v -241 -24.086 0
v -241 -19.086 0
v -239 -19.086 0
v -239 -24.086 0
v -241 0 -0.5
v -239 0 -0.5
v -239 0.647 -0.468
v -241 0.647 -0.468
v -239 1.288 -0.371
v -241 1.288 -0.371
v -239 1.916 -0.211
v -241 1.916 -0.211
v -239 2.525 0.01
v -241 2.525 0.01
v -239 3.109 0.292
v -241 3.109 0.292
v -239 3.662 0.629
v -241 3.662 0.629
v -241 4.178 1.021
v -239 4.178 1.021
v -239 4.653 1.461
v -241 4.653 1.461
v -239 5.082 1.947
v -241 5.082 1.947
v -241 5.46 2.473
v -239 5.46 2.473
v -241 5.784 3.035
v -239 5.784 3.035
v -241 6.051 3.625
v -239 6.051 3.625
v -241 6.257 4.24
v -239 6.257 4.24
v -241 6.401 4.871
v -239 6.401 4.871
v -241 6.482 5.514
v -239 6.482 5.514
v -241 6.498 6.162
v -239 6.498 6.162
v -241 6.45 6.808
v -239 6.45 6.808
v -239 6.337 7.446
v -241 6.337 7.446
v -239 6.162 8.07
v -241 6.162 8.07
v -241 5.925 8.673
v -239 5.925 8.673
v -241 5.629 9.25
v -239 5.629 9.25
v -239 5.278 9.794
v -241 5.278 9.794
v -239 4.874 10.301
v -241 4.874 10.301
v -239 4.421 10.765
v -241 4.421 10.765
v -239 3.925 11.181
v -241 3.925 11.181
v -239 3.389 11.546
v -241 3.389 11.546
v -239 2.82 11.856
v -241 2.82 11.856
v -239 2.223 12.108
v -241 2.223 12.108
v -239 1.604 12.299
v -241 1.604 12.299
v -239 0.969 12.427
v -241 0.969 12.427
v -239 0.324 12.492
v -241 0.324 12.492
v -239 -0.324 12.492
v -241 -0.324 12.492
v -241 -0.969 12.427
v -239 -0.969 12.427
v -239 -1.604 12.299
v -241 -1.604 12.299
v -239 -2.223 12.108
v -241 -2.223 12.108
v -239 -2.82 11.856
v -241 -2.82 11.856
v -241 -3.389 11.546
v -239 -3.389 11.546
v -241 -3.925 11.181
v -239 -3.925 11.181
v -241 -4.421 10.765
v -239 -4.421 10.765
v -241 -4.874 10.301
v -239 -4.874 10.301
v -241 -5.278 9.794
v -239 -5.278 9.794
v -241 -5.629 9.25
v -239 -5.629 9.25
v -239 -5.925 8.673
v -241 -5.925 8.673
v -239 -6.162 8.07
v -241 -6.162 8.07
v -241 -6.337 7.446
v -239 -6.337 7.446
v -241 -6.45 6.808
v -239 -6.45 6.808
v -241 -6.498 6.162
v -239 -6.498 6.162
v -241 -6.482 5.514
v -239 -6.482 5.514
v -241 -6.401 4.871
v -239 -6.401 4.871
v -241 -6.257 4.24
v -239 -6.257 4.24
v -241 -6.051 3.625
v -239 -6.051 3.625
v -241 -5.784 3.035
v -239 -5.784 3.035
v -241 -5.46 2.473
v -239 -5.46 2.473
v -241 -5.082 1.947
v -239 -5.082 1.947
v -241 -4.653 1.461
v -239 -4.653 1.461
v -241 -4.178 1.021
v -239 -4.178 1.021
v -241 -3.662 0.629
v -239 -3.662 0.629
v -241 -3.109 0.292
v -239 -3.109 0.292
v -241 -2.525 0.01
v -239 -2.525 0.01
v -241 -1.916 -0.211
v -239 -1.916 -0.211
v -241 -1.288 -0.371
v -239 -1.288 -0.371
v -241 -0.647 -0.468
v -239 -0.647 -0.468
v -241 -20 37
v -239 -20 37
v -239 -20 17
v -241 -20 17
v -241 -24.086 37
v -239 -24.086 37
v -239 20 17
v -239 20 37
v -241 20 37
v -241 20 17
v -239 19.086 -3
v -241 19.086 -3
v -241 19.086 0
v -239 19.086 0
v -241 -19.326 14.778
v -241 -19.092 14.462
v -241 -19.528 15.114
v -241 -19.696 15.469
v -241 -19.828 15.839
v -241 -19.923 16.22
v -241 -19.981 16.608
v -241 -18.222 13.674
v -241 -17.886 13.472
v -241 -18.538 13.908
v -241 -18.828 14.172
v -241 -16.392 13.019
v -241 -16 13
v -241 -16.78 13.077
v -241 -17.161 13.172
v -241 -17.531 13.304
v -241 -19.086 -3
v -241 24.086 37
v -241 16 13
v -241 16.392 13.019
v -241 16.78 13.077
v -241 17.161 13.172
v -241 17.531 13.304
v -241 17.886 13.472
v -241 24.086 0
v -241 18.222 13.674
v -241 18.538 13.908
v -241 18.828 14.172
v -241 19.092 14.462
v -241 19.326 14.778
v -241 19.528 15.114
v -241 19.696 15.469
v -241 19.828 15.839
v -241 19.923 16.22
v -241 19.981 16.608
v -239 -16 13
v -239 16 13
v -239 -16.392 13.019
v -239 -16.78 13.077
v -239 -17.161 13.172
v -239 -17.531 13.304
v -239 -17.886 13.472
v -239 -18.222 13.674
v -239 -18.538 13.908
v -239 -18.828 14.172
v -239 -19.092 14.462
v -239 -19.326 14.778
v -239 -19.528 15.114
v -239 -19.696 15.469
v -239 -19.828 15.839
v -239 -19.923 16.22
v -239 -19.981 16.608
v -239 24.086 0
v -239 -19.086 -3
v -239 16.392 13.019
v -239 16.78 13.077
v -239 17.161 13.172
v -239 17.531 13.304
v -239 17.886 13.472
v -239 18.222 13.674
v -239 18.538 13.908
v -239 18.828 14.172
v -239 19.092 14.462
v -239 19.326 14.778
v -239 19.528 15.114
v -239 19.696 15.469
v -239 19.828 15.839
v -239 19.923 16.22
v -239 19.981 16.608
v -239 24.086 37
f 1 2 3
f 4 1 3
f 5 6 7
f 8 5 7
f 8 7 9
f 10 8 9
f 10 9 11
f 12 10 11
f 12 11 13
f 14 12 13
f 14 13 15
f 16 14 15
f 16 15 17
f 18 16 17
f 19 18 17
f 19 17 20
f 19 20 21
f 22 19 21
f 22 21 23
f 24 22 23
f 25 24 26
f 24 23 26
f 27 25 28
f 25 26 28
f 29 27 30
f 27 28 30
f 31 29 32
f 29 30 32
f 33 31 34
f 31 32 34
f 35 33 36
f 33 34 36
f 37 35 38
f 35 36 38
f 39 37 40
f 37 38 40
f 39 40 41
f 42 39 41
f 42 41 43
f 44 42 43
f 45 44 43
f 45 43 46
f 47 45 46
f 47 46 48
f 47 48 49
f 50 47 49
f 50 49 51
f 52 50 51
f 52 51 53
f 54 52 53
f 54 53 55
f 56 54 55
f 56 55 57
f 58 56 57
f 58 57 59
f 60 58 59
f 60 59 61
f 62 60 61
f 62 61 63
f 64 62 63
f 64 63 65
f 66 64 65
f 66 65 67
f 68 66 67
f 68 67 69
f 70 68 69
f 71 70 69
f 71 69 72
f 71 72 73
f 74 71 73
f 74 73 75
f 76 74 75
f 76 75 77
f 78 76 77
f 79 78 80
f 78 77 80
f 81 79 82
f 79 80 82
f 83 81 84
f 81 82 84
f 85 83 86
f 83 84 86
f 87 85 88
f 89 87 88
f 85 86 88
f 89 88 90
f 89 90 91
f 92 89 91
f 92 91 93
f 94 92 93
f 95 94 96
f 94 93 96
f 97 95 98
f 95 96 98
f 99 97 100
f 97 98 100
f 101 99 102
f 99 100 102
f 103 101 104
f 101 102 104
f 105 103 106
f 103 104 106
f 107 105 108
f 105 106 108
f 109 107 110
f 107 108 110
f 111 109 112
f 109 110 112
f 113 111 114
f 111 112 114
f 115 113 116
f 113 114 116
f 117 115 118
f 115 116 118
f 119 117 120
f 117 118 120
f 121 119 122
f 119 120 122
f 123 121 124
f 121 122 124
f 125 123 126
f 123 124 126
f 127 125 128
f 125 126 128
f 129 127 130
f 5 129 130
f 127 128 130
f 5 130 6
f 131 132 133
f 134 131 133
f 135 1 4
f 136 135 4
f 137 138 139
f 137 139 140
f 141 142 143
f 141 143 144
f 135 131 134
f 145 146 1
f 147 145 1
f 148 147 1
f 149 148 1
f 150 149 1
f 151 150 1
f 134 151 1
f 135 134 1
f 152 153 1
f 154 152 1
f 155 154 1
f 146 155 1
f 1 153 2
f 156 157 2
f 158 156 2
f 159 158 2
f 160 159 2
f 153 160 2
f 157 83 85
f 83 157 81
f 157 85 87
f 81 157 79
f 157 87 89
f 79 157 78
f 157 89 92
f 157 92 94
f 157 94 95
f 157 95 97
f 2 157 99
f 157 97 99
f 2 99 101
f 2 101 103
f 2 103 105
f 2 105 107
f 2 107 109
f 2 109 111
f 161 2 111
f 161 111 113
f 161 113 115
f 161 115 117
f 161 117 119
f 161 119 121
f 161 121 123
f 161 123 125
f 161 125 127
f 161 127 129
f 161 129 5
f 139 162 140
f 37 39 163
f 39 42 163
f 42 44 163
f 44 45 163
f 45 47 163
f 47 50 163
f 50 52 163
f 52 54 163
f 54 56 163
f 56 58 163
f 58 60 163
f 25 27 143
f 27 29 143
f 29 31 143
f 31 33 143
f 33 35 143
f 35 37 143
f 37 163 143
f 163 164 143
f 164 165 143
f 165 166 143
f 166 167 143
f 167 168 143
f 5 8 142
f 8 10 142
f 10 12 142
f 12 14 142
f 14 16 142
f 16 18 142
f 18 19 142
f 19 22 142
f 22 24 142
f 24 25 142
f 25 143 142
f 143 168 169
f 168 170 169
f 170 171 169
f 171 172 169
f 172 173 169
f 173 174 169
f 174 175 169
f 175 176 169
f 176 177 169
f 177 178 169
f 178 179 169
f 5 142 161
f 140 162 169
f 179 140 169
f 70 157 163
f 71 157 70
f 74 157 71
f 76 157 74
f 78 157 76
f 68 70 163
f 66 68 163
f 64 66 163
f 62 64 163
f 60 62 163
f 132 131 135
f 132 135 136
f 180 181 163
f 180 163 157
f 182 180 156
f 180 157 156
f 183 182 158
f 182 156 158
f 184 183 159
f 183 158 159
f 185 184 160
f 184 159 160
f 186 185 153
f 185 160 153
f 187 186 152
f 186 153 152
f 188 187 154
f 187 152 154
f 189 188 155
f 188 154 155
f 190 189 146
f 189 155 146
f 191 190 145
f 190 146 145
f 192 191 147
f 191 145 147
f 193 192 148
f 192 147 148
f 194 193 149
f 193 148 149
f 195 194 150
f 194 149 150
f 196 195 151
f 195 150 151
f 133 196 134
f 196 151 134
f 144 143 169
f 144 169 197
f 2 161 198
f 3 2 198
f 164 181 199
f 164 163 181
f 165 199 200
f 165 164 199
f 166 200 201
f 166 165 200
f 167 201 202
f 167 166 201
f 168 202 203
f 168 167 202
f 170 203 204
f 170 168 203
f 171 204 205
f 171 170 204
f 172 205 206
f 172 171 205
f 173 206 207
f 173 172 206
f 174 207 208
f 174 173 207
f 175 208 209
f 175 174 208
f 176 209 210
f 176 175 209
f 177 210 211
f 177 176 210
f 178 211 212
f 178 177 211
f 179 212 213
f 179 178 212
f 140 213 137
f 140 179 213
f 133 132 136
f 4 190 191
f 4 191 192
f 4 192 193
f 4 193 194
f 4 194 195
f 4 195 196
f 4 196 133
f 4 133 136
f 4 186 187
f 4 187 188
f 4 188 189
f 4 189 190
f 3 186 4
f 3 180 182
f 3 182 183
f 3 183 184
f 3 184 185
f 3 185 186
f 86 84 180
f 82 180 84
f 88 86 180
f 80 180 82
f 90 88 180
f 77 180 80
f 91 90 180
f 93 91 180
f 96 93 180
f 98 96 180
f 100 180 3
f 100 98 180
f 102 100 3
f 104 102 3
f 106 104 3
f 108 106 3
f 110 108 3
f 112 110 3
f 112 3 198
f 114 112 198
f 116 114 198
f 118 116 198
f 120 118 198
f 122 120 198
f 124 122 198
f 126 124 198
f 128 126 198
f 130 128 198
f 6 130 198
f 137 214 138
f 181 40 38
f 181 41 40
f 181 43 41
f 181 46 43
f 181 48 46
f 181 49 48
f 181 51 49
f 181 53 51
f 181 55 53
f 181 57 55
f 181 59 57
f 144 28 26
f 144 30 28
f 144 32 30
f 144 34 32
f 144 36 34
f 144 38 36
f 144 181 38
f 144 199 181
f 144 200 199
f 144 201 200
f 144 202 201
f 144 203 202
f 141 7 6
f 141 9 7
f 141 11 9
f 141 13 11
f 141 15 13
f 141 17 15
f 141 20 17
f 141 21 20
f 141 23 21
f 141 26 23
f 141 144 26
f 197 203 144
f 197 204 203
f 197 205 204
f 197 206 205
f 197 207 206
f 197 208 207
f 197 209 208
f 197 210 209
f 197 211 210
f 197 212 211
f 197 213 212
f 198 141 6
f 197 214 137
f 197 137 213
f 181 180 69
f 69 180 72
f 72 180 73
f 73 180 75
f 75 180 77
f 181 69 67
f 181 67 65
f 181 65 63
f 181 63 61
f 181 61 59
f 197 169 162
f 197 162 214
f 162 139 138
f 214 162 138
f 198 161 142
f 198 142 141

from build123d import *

# Parameters (mm, degrees)
ESTRUSIONE_ESTRUSIONE1_DEPTH      = 13
ESTRUSIONE_ESTRUSIONE1_DEPTH_BACK = 3
SCHIZZO1_W                        = 2
SCHIZZO1_H                        = 38.172865154
SCHIZZO2_W                        = 2
SCHIZZO2_H                        = 37
ESTRUSIONE_ESTRUSIONE2_DEPTH      = 5
SCHIZZO3_W                        = 24
SCHIZZO3_H                        = 0.913567423
TAGLIO_ESTRUSIONE1_DEPTH          = 10
RACCORDO1_R                       = 4
RACCORDO1_OF_SPECCHIA1_R          = 4
SCHIZZO4_R                        = 6.5
TAGLIO_ESTRUSIONE2_DEPTH          = 10


with BuildPart() as part:
    # Schizzo1 → Estrusione-Estrusione1 (new, two sides: drawn at the far end of the back side and taken through both)
    with BuildSketch(Plane.XY.offset(-ESTRUSIONE_ESTRUSIONE1_DEPTH_BACK)):
        with Locations((-240, 0)):
            Rectangle(SCHIZZO1_W, SCHIZZO1_H)
    extrude(amount=ESTRUSIONE_ESTRUSIONE1_DEPTH + ESTRUSIONE_ESTRUSIONE1_DEPTH_BACK)

    # Schizzo2 → Estrusione-Estrusione2 (add)
    with BuildSketch(Plane(origin=(0, 19.086432577, 0), x_dir=(1, 0, 0), z_dir=(0, 1, 0))):
        with Locations((-240, -18.5)):
            Rectangle(SCHIZZO2_W, SCHIZZO2_H)
    estrusione_estrusione2 = extrude(amount=ESTRUSIONE_ESTRUSIONE2_DEPTH)

    # Schizzo3 → Taglio-Estrusione1 (cut)
    with BuildSketch(Plane(origin=(-239, 0, 0), x_dir=(0, 0, -1), z_dir=(1, 0, 0))):
        with Locations((-25, 19.543216288)):
            Rectangle(SCHIZZO3_W, SCHIZZO3_H)
    taglio_estrusione1 = extrude(amount=-TAGLIO_ESTRUSIONE1_DEPTH, mode=Mode.SUBTRACT)

    # Raccordo1
    raccordo1_edges = [part.edges().sort_by_distance(p)[0] for p in [
        (-240, 20, 13),
    ]]
    fillet(raccordo1_edges, radius=RACCORDO1_R)

    # Specchia1: Estrusione-Estrusione2, Taglio-Estrusione1 across plane
    add(estrusione_estrusione2.mirror(Plane.ZX))
    add(taglio_estrusione1.mirror(Plane.ZX), mode=Mode.SUBTRACT)

    # Raccordo1 of Specchia1
    raccordo1_of_specchia1_edges = [part.edges().sort_by_distance(p)[0] for p in [
        (-240, -20, 13),
    ]]
    fillet(raccordo1_of_specchia1_edges, radius=RACCORDO1_OF_SPECCHIA1_R)

    # Schizzo4 → Taglio-Estrusione2 (cut)
    with BuildSketch(Plane(origin=(-239, 0, 0), x_dir=(0, 0, -1), z_dir=(1, 0, 0))):
        with Locations((-6, 0)):
            Circle(SCHIZZO4_R)
    extrude(amount=-TAGLIO_ESTRUSIONE2_DEPTH, mode=Mode.SUBTRACT)


solid = part.part
